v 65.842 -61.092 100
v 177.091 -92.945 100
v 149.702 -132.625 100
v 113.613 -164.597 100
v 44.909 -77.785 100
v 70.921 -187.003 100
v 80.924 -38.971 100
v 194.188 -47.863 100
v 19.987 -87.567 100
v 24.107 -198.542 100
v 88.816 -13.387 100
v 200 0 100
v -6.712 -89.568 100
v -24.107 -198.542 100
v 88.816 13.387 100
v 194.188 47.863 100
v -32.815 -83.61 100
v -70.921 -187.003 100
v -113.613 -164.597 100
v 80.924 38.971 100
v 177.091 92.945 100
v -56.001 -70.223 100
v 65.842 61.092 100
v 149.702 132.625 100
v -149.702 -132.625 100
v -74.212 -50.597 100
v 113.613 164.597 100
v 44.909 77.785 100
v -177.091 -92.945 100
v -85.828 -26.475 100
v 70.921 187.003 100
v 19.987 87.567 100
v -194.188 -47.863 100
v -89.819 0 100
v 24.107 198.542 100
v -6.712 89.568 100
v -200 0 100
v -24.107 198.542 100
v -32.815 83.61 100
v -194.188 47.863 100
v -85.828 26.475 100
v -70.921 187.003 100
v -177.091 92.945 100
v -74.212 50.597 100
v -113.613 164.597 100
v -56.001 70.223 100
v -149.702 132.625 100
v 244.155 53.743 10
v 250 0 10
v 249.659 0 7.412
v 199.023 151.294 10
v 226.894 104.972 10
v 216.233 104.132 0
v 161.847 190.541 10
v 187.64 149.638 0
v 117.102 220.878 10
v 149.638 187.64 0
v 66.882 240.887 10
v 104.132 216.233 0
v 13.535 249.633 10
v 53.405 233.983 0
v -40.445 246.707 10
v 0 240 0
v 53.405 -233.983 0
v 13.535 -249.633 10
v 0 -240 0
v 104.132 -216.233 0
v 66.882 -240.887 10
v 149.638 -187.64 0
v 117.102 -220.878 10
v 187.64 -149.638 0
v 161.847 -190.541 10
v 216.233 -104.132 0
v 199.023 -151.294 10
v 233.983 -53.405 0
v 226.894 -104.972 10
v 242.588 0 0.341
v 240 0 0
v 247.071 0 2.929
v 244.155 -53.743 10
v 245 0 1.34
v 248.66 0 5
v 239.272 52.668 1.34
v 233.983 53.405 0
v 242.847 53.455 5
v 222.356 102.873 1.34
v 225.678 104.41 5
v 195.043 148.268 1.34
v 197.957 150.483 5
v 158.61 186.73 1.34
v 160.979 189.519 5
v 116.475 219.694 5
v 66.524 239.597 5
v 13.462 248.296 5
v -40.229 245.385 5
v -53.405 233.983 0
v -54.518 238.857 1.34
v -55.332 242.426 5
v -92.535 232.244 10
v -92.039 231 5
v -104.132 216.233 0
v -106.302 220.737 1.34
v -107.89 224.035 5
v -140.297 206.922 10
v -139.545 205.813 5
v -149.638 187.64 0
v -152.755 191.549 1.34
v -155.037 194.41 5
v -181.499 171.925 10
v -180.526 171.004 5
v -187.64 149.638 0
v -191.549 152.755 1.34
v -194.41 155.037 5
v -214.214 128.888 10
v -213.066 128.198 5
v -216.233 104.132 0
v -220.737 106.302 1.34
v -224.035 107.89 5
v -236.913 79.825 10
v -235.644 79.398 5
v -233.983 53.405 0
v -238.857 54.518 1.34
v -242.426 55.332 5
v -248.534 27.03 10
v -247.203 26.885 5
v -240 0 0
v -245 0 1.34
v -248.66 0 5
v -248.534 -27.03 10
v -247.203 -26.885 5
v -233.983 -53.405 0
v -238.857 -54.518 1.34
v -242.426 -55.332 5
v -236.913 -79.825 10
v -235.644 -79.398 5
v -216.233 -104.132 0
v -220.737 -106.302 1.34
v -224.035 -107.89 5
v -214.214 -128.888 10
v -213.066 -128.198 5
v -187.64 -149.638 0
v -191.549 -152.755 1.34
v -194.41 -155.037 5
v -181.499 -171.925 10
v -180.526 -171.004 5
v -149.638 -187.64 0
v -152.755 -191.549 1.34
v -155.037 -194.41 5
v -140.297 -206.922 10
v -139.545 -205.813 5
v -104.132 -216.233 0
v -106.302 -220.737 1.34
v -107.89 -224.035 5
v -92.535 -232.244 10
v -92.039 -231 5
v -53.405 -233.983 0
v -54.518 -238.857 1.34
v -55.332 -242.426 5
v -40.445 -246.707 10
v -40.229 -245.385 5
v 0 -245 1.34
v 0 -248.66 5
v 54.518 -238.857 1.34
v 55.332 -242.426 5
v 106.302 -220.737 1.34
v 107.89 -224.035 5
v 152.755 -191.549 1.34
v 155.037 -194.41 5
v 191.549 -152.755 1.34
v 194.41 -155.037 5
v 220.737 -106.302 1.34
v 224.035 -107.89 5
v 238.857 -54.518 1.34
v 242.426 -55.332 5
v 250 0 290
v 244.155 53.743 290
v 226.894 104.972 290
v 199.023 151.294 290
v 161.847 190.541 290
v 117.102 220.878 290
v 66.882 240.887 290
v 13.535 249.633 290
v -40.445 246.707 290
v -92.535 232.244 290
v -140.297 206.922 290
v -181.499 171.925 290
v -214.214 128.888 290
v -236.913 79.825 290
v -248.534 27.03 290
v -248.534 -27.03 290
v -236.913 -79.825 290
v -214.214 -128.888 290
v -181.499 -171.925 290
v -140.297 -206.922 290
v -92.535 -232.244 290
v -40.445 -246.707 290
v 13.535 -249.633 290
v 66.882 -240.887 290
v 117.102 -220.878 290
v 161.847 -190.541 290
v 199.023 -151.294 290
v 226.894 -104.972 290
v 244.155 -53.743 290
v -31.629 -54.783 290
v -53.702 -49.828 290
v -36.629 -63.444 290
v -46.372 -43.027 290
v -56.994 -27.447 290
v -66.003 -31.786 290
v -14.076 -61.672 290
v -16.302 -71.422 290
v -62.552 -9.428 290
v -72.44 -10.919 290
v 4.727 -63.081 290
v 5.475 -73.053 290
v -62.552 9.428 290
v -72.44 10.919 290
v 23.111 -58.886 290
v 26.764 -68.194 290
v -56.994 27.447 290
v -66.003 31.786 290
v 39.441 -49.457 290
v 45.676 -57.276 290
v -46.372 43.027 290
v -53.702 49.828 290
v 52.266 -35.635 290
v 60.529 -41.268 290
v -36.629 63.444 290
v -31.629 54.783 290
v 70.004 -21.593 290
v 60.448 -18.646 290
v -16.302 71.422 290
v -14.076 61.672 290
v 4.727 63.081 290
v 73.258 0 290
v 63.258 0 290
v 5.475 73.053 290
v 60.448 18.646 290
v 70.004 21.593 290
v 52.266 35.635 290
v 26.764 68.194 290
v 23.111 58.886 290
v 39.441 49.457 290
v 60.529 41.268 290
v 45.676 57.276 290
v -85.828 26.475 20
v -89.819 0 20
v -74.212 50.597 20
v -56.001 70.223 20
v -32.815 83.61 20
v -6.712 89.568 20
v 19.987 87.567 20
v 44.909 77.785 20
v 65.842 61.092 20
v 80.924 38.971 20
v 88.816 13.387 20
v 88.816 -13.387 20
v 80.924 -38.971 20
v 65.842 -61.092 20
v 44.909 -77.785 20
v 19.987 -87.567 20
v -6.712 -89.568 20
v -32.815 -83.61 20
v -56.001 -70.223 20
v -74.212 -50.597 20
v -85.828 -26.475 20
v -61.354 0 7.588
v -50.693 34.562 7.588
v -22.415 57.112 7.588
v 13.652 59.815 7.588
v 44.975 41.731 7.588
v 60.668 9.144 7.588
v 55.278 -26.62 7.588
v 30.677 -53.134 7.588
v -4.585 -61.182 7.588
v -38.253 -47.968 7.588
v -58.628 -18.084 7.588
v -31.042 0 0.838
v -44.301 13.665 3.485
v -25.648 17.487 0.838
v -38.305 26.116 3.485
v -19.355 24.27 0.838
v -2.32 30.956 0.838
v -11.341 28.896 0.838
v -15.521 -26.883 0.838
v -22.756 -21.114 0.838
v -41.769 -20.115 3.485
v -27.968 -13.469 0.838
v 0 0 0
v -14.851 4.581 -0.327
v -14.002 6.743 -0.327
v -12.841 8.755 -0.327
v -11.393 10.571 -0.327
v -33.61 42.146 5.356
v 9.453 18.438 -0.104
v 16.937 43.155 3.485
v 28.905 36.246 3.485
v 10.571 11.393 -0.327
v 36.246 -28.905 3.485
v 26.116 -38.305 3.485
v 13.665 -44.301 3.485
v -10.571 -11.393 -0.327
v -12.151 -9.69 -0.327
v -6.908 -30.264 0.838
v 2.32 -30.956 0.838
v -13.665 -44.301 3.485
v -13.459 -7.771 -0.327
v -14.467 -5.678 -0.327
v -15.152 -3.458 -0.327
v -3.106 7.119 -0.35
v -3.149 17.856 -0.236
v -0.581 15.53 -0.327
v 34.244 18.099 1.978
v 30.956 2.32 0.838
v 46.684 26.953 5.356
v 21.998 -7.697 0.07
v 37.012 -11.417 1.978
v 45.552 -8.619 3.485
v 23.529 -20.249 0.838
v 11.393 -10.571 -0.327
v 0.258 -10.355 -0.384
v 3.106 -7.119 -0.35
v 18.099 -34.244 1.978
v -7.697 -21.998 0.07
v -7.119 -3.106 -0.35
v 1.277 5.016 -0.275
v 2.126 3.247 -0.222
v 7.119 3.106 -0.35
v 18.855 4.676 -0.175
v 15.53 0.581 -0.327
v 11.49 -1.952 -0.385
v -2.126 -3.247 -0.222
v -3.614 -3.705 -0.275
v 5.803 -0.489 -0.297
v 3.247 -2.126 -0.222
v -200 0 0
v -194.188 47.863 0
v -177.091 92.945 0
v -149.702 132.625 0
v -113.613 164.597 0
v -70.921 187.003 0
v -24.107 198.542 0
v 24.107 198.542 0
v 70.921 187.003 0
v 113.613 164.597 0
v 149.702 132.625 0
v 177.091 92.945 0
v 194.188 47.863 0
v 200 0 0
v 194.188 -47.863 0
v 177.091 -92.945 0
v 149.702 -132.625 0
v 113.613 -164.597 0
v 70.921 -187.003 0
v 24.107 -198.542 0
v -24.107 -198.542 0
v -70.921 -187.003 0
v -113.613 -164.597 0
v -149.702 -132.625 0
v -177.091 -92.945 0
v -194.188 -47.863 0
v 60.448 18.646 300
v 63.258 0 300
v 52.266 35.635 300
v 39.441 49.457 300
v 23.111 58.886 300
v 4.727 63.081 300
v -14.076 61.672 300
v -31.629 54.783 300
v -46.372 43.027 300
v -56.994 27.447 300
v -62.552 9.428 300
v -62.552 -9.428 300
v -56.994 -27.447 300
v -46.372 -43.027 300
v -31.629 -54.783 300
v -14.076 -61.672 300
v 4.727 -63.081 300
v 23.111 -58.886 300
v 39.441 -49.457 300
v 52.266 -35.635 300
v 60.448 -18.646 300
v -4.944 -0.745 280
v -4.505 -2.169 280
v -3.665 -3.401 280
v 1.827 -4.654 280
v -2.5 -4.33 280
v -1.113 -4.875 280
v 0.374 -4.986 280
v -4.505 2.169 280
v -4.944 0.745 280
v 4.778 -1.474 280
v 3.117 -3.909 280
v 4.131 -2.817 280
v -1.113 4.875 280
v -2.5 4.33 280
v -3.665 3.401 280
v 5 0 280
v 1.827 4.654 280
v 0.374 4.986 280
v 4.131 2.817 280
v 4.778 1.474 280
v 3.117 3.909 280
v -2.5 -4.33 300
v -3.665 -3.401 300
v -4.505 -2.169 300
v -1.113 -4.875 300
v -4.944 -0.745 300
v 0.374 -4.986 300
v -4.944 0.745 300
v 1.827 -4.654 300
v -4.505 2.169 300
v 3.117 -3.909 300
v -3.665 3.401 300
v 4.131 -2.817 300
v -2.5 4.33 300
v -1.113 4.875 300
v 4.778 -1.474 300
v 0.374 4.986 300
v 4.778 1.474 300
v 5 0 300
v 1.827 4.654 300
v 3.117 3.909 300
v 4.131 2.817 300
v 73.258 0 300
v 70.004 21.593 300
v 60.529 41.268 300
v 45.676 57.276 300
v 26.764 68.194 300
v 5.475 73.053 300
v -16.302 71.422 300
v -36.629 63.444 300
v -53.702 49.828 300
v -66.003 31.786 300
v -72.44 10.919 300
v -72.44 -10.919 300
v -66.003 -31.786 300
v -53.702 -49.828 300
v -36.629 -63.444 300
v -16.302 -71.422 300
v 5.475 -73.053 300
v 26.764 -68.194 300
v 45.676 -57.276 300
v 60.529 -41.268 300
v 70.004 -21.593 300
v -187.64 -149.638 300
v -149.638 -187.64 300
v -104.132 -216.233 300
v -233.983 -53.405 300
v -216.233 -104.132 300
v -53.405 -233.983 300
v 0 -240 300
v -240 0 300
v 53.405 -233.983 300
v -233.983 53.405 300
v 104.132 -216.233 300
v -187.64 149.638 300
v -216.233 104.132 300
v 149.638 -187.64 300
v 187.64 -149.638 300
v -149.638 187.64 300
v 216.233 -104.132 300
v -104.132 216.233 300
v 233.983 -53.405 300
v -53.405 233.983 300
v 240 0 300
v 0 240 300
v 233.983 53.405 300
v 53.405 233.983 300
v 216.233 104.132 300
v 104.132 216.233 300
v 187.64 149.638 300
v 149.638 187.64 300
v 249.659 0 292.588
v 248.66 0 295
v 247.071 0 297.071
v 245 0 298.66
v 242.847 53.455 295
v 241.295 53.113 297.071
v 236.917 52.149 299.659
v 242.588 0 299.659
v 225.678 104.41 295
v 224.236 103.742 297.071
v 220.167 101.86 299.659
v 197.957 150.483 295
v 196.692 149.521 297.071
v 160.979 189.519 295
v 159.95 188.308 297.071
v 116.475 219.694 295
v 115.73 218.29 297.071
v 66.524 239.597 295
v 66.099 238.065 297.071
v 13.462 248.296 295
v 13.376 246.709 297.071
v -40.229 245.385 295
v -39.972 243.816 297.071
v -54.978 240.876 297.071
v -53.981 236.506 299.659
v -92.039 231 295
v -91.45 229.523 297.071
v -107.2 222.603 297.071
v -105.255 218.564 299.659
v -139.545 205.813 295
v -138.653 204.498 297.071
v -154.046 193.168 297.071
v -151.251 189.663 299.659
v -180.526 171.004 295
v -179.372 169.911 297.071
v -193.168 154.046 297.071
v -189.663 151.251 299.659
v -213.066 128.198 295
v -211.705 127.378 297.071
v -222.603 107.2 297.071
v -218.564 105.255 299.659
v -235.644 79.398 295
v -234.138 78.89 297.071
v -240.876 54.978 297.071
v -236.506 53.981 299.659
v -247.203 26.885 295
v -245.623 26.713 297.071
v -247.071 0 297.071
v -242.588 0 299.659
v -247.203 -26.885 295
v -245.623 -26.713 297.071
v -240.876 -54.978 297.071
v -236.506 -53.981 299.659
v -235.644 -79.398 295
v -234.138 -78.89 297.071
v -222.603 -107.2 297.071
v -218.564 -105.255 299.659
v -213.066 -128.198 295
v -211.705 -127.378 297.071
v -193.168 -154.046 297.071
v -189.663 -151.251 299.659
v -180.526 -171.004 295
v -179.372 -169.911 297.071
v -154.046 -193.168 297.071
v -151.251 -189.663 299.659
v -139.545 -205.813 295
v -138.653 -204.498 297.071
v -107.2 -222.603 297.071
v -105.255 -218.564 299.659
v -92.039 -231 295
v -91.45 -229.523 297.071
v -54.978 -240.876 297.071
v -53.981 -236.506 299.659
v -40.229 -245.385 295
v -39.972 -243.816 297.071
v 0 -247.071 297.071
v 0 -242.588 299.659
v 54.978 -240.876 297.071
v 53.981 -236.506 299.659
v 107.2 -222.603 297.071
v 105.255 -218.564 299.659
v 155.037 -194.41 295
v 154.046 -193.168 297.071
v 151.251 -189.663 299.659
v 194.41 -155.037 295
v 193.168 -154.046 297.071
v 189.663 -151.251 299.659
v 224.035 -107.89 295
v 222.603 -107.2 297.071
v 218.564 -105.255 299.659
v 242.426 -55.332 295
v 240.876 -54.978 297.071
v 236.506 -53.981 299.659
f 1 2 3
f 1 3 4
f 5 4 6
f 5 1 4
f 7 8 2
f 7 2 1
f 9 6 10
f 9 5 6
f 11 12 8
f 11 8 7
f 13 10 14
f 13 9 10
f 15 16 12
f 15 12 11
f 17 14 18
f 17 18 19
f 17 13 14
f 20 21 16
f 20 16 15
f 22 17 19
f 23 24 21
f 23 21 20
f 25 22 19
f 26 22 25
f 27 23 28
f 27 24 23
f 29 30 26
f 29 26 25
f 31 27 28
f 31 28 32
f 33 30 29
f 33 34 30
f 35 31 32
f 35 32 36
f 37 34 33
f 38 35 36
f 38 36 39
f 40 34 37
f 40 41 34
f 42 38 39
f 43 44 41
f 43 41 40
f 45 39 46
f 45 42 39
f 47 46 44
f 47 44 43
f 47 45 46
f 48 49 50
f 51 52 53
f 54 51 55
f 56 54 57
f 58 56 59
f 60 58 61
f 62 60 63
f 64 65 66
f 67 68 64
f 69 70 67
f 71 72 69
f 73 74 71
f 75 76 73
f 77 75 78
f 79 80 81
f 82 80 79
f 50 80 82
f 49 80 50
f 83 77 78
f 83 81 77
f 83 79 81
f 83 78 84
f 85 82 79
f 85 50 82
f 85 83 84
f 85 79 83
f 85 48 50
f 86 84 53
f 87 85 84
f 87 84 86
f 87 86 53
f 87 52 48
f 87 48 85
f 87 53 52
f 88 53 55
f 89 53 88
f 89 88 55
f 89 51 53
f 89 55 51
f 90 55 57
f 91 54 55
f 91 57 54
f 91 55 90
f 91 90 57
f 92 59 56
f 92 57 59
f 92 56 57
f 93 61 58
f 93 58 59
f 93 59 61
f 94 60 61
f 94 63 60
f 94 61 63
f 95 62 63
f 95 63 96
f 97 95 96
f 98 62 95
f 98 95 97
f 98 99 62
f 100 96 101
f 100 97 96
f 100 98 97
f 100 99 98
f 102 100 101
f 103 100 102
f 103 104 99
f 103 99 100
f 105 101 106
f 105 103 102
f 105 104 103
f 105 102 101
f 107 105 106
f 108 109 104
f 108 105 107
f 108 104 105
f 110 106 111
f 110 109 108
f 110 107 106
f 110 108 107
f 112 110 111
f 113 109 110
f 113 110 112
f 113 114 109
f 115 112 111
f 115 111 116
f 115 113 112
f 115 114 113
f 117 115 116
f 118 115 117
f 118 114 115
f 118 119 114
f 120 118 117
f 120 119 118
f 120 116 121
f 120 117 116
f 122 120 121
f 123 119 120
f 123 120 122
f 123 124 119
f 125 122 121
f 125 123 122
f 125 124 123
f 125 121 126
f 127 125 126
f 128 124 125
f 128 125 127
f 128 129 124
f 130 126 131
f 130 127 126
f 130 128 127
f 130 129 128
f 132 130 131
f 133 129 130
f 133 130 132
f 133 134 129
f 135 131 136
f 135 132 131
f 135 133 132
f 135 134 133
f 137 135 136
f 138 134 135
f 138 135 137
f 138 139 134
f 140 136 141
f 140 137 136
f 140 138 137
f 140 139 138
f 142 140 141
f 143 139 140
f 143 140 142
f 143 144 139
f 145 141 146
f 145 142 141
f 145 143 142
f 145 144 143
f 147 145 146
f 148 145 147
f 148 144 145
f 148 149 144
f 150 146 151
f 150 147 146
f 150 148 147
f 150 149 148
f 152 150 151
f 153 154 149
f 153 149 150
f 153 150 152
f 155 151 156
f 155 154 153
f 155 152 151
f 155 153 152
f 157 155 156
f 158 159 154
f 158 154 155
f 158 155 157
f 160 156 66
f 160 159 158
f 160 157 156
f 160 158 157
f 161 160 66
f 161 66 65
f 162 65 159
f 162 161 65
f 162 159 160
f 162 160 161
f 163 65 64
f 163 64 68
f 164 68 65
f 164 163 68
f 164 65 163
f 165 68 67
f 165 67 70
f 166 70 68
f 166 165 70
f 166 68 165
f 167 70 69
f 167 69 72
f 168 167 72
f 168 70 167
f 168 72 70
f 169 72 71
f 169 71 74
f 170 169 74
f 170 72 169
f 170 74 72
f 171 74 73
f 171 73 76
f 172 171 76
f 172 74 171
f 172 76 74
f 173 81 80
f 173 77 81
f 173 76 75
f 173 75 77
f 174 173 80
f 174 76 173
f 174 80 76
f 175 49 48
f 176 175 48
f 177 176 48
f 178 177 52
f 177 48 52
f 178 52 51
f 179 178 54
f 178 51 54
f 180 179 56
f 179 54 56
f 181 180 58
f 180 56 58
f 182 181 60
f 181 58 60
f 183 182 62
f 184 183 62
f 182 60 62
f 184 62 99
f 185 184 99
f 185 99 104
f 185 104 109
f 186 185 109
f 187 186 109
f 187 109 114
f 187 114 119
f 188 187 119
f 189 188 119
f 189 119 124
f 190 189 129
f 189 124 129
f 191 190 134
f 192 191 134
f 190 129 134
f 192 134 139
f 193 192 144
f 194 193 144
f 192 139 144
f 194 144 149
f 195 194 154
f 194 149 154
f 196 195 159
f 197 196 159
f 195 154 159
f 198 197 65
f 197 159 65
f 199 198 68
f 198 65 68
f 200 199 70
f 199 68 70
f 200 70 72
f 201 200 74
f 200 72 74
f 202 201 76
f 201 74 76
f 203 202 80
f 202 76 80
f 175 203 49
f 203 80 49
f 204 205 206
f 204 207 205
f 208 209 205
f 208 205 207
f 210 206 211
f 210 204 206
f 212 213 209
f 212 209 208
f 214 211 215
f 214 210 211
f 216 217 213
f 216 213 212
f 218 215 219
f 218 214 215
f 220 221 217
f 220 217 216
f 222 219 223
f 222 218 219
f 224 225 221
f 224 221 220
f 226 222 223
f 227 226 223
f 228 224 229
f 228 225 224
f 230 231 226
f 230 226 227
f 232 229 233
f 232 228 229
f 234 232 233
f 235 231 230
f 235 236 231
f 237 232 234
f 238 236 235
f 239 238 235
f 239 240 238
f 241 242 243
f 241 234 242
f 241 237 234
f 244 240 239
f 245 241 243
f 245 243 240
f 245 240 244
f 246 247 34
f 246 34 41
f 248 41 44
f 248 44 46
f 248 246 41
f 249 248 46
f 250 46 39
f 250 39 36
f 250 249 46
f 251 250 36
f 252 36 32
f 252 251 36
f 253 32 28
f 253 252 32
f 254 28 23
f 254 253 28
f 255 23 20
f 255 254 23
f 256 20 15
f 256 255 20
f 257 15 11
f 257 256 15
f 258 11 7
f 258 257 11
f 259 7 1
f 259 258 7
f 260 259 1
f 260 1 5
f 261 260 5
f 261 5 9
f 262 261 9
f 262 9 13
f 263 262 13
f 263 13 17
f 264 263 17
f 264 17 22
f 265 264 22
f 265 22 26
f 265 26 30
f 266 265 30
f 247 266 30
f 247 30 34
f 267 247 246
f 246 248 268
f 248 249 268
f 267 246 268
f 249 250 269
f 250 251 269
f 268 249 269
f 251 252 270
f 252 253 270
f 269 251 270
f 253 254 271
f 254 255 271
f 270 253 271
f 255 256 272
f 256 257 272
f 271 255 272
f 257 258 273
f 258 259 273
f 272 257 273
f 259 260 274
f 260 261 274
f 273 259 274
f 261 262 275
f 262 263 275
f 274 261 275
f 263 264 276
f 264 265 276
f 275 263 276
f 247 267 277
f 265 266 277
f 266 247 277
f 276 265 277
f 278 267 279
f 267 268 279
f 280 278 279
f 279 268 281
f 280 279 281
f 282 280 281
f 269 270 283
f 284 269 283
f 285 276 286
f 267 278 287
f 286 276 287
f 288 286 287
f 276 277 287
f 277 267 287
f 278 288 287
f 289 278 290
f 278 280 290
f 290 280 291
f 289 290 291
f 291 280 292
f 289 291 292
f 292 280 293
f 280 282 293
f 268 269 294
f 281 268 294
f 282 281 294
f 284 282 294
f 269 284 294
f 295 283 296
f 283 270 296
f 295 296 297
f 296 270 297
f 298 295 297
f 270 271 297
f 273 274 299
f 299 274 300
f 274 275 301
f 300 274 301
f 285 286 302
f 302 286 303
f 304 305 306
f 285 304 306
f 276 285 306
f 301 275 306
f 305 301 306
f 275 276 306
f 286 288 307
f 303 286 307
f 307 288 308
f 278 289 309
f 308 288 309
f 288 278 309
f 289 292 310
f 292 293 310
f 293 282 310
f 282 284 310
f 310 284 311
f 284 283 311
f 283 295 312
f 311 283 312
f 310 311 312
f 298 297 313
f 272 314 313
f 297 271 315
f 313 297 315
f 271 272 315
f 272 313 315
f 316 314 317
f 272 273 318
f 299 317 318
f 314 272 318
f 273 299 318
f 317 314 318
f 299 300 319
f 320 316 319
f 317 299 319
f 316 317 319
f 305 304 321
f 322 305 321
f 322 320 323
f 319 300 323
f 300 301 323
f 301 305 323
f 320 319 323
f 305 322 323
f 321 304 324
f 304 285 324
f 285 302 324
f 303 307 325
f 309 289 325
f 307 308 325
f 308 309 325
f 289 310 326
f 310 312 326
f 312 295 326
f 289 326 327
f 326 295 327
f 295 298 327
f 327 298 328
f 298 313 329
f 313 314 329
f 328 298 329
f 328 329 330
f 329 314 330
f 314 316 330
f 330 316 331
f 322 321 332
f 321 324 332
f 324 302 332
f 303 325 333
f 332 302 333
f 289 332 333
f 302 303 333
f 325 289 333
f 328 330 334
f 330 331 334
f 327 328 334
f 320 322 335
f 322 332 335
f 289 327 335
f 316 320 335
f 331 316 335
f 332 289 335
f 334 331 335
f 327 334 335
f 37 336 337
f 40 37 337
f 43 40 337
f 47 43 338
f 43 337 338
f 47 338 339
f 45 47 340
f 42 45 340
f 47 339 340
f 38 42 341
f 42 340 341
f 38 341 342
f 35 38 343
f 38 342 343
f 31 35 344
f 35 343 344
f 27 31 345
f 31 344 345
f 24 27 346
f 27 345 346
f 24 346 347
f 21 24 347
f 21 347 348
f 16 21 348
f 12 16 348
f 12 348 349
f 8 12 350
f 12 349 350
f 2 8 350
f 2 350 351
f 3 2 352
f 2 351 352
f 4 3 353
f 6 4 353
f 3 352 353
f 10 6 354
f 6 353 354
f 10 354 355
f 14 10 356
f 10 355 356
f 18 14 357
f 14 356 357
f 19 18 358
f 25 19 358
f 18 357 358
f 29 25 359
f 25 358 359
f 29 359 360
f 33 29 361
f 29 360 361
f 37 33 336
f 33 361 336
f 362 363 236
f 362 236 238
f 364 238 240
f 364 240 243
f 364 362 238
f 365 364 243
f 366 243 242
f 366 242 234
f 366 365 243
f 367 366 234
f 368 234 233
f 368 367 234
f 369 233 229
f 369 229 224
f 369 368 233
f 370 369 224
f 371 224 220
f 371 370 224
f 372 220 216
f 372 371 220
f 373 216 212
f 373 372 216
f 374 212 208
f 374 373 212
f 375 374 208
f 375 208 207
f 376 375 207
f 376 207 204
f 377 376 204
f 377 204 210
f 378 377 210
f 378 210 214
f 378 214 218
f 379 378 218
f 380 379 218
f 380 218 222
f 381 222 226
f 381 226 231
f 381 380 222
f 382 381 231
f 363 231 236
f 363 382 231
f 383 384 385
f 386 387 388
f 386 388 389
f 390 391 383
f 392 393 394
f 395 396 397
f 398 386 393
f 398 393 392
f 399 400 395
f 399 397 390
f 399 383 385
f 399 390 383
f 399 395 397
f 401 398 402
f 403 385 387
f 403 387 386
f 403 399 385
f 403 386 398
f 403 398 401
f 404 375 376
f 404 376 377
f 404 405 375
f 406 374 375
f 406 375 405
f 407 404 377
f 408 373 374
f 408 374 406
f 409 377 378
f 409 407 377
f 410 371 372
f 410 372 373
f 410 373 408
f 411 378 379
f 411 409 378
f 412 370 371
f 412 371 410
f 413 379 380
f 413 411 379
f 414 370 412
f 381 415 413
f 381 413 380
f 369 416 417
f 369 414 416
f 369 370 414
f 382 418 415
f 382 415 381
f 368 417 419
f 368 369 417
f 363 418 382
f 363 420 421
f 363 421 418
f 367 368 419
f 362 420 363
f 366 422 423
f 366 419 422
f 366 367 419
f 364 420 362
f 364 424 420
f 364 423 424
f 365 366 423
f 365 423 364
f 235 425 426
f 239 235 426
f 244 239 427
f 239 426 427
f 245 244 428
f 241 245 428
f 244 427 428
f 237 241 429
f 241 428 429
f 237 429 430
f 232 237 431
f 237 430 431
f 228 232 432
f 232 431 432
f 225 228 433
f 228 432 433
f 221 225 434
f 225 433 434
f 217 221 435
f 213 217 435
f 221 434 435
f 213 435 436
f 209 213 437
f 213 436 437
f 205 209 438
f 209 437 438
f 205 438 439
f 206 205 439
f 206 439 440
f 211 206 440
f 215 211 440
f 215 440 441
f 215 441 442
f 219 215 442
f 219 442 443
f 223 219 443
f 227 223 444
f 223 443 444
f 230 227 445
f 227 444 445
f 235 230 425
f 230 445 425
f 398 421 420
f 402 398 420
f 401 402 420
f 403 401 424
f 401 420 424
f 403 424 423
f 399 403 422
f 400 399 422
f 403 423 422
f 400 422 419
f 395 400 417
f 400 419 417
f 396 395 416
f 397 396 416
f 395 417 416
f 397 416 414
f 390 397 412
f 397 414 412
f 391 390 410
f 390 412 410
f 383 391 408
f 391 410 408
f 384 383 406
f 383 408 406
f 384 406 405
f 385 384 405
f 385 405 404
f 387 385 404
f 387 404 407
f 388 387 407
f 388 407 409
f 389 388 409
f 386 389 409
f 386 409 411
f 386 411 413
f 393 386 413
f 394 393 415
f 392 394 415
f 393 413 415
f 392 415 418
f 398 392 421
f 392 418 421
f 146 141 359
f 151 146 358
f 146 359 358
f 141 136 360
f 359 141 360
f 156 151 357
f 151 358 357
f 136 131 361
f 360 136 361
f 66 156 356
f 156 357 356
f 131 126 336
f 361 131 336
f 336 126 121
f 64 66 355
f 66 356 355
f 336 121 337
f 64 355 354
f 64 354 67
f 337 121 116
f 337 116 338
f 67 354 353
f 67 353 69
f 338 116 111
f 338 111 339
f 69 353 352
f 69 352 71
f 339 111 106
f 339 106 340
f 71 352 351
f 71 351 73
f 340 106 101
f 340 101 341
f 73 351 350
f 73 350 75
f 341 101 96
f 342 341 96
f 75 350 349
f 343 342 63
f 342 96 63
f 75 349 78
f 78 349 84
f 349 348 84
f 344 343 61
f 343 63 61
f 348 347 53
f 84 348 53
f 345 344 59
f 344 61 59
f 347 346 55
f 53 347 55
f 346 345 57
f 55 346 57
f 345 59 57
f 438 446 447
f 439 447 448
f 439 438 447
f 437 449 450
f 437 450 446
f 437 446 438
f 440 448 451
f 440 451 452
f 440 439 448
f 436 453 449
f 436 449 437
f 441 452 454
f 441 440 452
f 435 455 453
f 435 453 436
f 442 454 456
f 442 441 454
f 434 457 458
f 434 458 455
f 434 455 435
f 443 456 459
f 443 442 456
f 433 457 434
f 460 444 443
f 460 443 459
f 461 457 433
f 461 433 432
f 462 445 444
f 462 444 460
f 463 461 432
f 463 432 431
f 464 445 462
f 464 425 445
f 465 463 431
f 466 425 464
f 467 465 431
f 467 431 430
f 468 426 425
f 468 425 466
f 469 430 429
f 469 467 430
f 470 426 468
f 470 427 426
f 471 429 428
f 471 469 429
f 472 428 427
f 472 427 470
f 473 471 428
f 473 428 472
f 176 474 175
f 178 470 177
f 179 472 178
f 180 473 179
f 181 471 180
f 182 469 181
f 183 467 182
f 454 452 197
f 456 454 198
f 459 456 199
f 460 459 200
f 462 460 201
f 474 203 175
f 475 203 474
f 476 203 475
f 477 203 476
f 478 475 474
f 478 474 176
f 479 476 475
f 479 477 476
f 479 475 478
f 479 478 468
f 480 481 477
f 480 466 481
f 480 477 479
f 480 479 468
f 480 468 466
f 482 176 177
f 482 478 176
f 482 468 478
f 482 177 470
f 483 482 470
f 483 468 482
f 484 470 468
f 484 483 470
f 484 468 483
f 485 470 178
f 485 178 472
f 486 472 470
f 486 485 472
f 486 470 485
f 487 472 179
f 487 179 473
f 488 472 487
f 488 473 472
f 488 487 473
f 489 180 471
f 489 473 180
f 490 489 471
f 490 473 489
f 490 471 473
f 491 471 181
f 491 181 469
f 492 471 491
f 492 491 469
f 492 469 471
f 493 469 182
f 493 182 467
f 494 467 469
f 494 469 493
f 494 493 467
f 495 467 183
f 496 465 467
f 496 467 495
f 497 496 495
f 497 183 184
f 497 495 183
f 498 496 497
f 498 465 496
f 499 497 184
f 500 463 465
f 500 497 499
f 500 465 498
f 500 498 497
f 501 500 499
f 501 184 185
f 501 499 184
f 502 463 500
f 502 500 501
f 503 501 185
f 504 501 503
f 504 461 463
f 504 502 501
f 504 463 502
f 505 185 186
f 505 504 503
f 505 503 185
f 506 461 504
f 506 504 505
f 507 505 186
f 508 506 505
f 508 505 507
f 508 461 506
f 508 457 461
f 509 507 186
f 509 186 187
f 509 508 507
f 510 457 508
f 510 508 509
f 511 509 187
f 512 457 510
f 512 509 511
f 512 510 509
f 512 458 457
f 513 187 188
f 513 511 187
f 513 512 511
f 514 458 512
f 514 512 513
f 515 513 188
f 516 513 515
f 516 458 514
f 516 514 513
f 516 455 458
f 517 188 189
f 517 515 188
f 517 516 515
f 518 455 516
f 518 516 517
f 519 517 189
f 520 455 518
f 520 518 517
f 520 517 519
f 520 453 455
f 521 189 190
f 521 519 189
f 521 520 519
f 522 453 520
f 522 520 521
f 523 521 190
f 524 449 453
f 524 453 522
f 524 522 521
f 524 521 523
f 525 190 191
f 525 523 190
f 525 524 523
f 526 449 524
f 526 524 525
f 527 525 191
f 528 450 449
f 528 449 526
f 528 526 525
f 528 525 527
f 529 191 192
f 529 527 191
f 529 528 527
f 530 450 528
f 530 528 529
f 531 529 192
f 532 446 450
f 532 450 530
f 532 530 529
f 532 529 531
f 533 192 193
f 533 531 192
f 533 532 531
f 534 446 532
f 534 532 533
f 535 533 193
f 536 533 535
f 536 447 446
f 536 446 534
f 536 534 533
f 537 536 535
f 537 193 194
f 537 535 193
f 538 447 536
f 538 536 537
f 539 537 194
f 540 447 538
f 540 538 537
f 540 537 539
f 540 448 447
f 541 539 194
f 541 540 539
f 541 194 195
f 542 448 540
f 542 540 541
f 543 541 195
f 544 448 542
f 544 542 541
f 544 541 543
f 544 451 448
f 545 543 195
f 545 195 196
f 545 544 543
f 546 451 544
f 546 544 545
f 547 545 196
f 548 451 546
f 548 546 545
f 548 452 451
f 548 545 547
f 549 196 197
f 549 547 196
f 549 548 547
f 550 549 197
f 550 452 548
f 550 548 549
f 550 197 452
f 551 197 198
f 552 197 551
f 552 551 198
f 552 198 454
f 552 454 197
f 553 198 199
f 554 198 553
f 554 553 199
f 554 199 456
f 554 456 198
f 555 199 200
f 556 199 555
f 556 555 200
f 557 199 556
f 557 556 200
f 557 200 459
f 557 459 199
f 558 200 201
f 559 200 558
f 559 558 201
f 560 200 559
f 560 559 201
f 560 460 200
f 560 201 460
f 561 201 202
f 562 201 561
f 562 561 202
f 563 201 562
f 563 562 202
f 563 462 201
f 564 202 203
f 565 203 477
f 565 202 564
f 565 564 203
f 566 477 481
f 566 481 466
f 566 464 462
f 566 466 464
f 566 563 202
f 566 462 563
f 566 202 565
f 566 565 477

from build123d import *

# Parameters (mm, degrees)
SKETCH1_R          = 250
EXTRUDE1_DEPTH     = 300
SKETCH2_R          = 5
CUT_EXTRUDE1_DEPTH = 20
SKETCH3_R          = 200
SKETCH3_R_2        = 89.818842926
CUT_EXTRUDE2_DEPTH = 100
SKETCH4_R          = 89.818842926
CUT_EXTRUDE3_DEPTH = 20
FILLET1_R          = 10
SKETCH6_R          = 73.258337553
SKETCH6_R_2        = 63.258337553
CUT_EXTRUDE4_DEPTH = 10


with BuildPart() as part:
    # Sketch1 → Extrude1 (new body)
    with BuildSketch(Plane.XY):
        Circle(SKETCH1_R)
    extrude(amount=EXTRUDE1_DEPTH)

    # Sketch2 → Cut-Extrude1 (cut)
    with BuildSketch(Plane.XY.offset(300)):
        Circle(SKETCH2_R)
    extrude(amount=-CUT_EXTRUDE1_DEPTH, mode=Mode.SUBTRACT)

    # Sketch3 → Cut-Extrude2 (cut)
    with BuildSketch(Plane(origin=(0, 0, 0), x_dir=(-1, 0, 0), z_dir=(0, 0, -1))):
        Circle(SKETCH3_R)
        Circle(SKETCH3_R_2, mode=Mode.SUBTRACT)
    extrude(amount=-CUT_EXTRUDE2_DEPTH, mode=Mode.SUBTRACT)

    # Sketch4 → Cut-Extrude3 (cut)
    with BuildSketch(Plane(origin=(0, 0, 0), x_dir=(-1, 0, 0), z_dir=(0, 0, -1))):
        Circle(SKETCH4_R)
    extrude(amount=-CUT_EXTRUDE3_DEPTH, mode=Mode.SUBTRACT)

    # Sketch5 → Revolve1 (revolve)
    with BuildSketch(Plane(origin=(0, 0, 0), x_dir=(1, 0, 0), z_dir=(0, 1, 0))):
        with BuildLine():
            Line((0, -20), (0, 0))
            ThreePointArc((0, 0), (-46.360181472, -3.484720731), (-89.818842926, -20))
            Line((-89.818842926, -20), (0, -20))
        make_face()
    revolve(axis=Axis((0, 0, 20), (0, 0, -1)))

    # Fillet1
    fillet1_edges = [part.edges().sort_by_distance(p)[0] for p in [
        (-250, 0, 0),
        (-250, 0, 300),
    ]]
    fillet(fillet1_edges, radius=FILLET1_R)

    # Sketch6 → Cut-Extrude4 (cut)
    with BuildSketch(Plane.XY.offset(300)):
        Circle(SKETCH6_R)
        Circle(SKETCH6_R_2, mode=Mode.SUBTRACT)
    extrude(amount=-CUT_EXTRUDE4_DEPTH, mode=Mode.SUBTRACT)


solid = part.part
